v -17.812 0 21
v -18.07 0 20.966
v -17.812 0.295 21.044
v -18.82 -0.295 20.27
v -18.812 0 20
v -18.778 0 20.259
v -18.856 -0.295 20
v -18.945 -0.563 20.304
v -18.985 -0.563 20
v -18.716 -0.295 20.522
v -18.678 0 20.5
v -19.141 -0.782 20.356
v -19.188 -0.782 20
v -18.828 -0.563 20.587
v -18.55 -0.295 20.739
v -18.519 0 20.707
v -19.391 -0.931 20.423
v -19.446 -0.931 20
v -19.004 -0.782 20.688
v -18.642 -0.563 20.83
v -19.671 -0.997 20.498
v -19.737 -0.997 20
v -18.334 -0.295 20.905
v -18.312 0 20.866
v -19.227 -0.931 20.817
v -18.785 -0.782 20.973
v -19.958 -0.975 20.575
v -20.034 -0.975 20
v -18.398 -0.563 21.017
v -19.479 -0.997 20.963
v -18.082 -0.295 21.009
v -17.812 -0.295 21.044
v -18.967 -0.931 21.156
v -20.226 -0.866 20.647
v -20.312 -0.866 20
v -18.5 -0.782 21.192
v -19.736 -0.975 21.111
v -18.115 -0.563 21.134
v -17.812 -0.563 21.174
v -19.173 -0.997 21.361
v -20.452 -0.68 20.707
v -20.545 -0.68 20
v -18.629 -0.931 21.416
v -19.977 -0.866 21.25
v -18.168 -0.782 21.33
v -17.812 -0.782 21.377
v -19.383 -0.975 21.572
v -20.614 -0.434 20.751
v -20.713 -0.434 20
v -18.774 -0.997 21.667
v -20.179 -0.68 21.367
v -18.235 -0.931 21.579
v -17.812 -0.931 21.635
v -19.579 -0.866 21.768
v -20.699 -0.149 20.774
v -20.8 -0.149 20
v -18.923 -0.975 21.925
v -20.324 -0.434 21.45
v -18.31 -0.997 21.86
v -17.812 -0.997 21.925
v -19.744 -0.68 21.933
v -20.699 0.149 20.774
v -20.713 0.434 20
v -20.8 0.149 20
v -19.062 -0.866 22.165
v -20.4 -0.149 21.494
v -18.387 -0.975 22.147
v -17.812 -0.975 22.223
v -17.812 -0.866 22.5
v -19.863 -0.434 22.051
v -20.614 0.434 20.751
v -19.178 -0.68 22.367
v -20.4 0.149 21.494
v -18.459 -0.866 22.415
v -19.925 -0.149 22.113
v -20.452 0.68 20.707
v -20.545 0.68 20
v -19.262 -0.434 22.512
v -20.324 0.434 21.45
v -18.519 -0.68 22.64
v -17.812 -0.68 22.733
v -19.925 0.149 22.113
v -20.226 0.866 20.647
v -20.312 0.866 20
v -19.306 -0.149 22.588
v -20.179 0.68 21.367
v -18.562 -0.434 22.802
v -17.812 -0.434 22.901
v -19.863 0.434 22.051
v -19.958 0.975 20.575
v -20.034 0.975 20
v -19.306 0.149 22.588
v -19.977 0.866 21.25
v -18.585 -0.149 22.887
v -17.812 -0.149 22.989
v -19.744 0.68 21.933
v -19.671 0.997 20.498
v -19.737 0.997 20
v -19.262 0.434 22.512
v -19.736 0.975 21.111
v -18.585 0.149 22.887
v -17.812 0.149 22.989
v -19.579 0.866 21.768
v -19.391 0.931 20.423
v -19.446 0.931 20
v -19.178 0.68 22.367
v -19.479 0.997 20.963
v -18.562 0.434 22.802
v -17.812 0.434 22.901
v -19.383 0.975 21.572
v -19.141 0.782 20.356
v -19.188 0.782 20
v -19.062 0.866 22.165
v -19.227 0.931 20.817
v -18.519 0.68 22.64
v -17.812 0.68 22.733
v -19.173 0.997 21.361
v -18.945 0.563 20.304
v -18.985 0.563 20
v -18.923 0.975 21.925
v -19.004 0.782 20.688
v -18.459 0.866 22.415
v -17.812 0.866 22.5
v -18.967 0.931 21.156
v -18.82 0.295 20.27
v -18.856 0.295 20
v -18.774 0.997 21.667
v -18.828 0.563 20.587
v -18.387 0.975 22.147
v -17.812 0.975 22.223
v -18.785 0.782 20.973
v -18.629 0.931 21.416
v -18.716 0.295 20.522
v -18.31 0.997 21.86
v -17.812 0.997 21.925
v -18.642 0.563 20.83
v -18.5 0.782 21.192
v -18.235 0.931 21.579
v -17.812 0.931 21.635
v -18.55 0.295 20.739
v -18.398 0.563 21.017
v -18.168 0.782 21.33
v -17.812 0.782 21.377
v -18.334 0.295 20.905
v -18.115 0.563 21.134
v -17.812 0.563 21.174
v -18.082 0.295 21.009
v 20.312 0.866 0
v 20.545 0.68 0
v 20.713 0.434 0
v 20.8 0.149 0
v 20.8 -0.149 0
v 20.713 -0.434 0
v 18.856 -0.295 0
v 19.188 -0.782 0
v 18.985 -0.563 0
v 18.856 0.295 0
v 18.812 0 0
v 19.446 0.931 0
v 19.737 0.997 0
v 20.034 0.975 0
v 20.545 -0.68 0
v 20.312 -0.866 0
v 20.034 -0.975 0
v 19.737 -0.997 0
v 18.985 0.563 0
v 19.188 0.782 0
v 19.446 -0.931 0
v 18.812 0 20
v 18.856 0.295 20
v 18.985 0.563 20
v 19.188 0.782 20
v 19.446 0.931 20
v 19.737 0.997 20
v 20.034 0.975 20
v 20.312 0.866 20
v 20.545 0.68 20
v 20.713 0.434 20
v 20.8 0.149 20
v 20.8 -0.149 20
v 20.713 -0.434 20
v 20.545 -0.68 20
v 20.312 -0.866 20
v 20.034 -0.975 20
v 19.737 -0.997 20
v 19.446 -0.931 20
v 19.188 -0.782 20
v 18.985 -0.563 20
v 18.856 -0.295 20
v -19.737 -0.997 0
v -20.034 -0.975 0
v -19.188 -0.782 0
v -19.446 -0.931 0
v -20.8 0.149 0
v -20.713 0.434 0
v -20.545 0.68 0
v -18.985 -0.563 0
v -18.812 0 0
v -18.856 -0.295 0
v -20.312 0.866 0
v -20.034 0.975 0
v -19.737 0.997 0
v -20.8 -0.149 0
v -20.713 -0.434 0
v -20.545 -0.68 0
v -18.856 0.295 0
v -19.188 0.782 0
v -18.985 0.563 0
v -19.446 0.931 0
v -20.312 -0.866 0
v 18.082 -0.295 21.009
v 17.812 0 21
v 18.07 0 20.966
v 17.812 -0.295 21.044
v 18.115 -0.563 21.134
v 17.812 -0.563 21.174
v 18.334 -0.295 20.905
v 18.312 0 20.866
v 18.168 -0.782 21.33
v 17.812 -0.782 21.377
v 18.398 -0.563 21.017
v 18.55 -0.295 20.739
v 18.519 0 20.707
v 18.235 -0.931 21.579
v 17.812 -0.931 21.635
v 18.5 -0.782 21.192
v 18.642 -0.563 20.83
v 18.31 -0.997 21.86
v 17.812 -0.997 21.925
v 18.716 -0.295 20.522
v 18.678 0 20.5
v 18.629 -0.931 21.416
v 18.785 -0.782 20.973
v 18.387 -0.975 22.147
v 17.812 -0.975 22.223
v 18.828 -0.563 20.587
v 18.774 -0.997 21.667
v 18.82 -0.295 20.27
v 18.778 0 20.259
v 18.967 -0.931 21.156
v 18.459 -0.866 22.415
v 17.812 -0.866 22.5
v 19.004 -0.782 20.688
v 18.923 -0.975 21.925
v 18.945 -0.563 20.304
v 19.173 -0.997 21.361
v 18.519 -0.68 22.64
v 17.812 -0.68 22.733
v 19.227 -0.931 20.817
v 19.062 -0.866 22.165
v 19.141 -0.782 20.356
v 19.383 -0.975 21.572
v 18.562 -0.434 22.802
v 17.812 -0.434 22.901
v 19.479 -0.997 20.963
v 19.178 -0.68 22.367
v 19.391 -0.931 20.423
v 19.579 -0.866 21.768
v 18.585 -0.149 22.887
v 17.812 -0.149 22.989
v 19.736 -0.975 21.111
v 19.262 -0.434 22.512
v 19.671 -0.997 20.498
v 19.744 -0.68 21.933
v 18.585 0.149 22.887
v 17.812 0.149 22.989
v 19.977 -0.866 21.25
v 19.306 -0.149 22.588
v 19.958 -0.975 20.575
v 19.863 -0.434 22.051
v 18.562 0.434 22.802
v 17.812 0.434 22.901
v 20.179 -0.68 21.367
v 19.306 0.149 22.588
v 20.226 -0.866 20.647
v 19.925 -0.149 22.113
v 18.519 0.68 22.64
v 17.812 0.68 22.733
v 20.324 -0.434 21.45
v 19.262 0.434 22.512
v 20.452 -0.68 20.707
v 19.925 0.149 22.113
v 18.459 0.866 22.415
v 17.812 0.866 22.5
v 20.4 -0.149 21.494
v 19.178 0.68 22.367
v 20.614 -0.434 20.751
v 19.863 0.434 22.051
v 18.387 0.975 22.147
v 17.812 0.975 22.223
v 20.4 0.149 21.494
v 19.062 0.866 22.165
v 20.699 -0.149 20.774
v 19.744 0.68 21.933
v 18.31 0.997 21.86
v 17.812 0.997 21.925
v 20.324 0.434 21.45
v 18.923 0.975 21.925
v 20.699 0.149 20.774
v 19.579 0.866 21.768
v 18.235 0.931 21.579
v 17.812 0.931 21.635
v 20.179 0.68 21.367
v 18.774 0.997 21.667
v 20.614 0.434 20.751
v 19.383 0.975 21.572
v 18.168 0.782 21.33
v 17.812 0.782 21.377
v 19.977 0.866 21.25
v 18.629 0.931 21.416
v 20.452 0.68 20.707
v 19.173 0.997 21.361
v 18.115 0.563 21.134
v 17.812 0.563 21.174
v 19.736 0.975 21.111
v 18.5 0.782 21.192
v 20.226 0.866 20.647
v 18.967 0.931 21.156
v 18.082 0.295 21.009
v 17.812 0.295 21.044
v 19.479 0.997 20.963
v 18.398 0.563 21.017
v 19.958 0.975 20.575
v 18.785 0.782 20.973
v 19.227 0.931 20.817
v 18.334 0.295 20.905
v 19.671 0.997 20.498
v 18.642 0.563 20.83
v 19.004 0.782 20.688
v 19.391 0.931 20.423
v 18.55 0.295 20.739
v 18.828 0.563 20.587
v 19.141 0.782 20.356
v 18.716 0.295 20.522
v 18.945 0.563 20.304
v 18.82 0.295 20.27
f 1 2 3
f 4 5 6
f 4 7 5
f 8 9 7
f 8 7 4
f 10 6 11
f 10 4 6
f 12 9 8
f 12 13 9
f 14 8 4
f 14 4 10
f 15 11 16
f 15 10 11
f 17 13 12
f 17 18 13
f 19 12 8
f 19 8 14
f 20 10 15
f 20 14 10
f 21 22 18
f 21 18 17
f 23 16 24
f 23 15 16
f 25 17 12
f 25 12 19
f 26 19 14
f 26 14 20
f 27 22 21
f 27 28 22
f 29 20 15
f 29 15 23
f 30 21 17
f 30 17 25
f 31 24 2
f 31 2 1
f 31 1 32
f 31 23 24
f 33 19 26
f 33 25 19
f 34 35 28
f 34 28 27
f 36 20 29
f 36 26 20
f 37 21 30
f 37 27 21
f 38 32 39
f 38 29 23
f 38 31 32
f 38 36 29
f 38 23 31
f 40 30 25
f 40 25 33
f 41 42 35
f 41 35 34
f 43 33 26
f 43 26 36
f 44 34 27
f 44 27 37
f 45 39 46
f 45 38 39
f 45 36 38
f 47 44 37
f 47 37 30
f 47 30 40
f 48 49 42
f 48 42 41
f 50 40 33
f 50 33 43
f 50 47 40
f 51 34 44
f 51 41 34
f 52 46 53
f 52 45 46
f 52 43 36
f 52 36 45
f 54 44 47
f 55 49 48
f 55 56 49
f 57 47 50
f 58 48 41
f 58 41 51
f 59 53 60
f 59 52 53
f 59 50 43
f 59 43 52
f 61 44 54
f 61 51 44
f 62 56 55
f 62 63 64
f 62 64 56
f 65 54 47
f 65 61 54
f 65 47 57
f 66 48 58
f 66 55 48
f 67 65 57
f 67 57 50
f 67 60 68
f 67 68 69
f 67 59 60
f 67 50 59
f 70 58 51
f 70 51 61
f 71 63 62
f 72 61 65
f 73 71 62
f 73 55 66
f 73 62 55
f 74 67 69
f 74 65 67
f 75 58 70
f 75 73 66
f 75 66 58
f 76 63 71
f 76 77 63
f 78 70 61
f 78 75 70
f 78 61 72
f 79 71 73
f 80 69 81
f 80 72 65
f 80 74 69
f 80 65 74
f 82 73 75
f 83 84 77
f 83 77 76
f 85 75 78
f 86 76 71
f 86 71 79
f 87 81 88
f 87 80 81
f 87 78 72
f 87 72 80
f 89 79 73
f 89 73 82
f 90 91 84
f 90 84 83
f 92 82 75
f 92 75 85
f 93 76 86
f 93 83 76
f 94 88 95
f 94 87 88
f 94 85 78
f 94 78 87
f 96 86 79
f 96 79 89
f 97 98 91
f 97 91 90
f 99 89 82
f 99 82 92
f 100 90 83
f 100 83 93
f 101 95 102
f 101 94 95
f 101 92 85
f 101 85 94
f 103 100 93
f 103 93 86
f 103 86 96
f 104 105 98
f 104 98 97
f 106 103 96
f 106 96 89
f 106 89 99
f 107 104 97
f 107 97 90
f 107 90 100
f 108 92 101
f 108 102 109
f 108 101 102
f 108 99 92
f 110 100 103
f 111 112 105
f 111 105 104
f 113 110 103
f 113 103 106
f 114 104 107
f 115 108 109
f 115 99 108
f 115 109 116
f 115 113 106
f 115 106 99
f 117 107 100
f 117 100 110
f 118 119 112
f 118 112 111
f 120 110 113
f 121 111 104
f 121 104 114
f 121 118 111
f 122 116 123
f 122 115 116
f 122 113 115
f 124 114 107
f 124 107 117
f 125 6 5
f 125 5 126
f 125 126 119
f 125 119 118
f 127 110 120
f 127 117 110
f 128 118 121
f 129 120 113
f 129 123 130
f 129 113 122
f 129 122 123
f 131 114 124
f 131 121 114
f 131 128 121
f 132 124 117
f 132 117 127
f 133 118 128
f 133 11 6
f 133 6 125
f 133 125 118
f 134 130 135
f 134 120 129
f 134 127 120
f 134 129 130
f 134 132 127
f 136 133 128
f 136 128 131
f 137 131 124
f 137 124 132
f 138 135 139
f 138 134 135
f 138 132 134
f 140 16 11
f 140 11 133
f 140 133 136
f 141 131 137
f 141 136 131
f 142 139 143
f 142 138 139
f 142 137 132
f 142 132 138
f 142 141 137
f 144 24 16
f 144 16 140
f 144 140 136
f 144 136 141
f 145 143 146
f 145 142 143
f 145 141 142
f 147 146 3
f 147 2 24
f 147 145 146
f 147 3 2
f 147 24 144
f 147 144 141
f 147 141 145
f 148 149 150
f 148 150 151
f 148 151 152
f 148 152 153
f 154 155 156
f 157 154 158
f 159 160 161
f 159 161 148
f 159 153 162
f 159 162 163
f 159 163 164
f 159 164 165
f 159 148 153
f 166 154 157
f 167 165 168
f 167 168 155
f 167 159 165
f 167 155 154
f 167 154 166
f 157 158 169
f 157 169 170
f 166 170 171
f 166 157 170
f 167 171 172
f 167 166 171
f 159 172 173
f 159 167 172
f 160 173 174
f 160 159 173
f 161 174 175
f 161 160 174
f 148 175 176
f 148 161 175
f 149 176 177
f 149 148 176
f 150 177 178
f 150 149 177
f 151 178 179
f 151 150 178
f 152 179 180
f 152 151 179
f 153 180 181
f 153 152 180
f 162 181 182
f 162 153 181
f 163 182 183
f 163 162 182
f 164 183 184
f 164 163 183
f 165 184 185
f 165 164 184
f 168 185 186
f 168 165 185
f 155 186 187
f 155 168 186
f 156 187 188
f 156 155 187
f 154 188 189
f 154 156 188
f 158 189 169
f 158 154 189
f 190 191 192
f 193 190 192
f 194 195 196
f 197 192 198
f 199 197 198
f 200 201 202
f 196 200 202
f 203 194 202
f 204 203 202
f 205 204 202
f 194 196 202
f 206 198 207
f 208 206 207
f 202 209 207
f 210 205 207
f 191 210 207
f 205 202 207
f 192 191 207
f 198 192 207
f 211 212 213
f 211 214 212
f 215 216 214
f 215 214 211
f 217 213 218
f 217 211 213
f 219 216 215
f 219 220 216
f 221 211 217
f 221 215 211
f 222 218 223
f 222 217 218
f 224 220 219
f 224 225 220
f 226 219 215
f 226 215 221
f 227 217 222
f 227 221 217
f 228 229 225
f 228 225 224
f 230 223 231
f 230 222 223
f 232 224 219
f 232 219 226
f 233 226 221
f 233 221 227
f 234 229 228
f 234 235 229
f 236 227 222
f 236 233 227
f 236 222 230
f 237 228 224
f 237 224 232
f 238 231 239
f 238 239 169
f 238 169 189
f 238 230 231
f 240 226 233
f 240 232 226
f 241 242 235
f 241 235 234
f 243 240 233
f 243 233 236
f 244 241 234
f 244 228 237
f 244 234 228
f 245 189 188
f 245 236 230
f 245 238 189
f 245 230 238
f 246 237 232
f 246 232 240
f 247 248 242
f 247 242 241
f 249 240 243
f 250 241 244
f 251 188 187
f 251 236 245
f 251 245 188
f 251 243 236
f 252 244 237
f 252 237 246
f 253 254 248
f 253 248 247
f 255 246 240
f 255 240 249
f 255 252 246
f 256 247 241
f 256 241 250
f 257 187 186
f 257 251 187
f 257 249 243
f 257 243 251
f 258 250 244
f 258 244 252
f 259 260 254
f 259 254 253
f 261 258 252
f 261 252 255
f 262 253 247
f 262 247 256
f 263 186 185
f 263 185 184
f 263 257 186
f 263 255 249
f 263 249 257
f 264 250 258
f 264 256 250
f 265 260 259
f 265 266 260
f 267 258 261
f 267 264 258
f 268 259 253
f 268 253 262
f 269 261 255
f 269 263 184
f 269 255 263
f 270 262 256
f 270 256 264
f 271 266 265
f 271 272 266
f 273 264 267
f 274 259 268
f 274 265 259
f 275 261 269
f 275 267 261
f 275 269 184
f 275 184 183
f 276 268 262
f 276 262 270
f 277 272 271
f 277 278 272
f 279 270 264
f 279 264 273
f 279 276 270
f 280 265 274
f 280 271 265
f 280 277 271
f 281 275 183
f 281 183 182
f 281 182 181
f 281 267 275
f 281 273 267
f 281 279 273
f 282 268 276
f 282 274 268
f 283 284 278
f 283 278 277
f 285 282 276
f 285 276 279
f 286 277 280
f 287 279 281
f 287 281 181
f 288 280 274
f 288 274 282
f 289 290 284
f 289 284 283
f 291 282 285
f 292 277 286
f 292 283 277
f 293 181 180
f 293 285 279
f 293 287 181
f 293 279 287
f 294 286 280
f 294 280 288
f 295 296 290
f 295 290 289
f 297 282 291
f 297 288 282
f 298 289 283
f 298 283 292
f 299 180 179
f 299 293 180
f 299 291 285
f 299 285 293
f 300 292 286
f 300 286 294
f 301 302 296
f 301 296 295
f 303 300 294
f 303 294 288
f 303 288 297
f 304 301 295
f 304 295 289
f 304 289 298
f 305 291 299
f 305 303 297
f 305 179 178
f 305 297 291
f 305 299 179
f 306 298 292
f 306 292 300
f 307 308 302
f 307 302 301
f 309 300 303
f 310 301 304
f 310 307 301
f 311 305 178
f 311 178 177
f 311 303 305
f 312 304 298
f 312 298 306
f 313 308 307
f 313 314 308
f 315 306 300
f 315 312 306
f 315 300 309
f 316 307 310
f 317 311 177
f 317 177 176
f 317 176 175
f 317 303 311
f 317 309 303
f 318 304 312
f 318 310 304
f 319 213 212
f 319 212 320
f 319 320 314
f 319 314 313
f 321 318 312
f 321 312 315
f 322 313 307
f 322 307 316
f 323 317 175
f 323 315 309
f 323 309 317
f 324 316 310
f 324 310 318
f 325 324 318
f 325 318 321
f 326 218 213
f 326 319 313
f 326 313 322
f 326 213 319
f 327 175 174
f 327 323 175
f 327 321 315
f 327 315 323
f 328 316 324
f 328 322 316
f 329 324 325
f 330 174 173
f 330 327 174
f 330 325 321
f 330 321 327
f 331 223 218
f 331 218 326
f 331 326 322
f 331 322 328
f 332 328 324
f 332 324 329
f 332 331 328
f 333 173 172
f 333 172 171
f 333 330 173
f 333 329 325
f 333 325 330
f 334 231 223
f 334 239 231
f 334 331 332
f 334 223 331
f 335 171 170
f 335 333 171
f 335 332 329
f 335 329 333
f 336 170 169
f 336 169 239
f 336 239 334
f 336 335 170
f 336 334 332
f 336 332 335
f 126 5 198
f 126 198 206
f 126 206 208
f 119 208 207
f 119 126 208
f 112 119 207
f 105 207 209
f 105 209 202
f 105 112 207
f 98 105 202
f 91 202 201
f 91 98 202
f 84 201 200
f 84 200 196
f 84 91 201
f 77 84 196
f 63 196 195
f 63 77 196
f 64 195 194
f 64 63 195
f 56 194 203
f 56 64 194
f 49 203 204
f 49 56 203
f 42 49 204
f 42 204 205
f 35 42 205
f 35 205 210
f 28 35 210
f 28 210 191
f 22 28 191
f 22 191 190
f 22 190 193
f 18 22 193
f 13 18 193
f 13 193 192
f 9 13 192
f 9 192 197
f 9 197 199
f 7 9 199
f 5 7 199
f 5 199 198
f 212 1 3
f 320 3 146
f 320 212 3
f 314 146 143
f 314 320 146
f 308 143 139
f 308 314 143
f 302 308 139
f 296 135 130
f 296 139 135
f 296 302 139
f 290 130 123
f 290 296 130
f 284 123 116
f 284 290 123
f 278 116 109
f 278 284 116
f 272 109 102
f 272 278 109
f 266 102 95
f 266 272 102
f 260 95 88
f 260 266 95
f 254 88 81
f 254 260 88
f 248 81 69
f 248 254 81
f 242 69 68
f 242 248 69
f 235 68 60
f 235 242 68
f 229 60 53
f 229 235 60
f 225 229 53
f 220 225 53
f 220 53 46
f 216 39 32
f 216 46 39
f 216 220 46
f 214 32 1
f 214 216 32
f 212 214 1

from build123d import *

# Parameters (mm, degrees)
F0_R = 1


with BuildPart() as f2:
    # F2: sweep along a path in F1
    with BuildLine(Plane.XZ) as f2_path:
        Line((-19.811615, 0), (-19.811615, 20))
        ThreePointArc((-19.811615, 20), (-19.225829, 21.414214), (-17.811615, 22))
        Line((-17.811615, 22), (0, 22))
        Line((0, 22), (17.811615, 22))
        ThreePointArc((17.811615, 22), (19.225829, 21.414214), (19.811615, 20))
        Line((19.811615, 20), (19.811615, 0))
    # F0 (on Top) → F2 (sweep)
    with BuildSketch(Plane.XY):
        with Locations((-19.811615, 0)):
            Circle(F0_R)
    sweep(path=f2_path.line)


solid = f2.part
